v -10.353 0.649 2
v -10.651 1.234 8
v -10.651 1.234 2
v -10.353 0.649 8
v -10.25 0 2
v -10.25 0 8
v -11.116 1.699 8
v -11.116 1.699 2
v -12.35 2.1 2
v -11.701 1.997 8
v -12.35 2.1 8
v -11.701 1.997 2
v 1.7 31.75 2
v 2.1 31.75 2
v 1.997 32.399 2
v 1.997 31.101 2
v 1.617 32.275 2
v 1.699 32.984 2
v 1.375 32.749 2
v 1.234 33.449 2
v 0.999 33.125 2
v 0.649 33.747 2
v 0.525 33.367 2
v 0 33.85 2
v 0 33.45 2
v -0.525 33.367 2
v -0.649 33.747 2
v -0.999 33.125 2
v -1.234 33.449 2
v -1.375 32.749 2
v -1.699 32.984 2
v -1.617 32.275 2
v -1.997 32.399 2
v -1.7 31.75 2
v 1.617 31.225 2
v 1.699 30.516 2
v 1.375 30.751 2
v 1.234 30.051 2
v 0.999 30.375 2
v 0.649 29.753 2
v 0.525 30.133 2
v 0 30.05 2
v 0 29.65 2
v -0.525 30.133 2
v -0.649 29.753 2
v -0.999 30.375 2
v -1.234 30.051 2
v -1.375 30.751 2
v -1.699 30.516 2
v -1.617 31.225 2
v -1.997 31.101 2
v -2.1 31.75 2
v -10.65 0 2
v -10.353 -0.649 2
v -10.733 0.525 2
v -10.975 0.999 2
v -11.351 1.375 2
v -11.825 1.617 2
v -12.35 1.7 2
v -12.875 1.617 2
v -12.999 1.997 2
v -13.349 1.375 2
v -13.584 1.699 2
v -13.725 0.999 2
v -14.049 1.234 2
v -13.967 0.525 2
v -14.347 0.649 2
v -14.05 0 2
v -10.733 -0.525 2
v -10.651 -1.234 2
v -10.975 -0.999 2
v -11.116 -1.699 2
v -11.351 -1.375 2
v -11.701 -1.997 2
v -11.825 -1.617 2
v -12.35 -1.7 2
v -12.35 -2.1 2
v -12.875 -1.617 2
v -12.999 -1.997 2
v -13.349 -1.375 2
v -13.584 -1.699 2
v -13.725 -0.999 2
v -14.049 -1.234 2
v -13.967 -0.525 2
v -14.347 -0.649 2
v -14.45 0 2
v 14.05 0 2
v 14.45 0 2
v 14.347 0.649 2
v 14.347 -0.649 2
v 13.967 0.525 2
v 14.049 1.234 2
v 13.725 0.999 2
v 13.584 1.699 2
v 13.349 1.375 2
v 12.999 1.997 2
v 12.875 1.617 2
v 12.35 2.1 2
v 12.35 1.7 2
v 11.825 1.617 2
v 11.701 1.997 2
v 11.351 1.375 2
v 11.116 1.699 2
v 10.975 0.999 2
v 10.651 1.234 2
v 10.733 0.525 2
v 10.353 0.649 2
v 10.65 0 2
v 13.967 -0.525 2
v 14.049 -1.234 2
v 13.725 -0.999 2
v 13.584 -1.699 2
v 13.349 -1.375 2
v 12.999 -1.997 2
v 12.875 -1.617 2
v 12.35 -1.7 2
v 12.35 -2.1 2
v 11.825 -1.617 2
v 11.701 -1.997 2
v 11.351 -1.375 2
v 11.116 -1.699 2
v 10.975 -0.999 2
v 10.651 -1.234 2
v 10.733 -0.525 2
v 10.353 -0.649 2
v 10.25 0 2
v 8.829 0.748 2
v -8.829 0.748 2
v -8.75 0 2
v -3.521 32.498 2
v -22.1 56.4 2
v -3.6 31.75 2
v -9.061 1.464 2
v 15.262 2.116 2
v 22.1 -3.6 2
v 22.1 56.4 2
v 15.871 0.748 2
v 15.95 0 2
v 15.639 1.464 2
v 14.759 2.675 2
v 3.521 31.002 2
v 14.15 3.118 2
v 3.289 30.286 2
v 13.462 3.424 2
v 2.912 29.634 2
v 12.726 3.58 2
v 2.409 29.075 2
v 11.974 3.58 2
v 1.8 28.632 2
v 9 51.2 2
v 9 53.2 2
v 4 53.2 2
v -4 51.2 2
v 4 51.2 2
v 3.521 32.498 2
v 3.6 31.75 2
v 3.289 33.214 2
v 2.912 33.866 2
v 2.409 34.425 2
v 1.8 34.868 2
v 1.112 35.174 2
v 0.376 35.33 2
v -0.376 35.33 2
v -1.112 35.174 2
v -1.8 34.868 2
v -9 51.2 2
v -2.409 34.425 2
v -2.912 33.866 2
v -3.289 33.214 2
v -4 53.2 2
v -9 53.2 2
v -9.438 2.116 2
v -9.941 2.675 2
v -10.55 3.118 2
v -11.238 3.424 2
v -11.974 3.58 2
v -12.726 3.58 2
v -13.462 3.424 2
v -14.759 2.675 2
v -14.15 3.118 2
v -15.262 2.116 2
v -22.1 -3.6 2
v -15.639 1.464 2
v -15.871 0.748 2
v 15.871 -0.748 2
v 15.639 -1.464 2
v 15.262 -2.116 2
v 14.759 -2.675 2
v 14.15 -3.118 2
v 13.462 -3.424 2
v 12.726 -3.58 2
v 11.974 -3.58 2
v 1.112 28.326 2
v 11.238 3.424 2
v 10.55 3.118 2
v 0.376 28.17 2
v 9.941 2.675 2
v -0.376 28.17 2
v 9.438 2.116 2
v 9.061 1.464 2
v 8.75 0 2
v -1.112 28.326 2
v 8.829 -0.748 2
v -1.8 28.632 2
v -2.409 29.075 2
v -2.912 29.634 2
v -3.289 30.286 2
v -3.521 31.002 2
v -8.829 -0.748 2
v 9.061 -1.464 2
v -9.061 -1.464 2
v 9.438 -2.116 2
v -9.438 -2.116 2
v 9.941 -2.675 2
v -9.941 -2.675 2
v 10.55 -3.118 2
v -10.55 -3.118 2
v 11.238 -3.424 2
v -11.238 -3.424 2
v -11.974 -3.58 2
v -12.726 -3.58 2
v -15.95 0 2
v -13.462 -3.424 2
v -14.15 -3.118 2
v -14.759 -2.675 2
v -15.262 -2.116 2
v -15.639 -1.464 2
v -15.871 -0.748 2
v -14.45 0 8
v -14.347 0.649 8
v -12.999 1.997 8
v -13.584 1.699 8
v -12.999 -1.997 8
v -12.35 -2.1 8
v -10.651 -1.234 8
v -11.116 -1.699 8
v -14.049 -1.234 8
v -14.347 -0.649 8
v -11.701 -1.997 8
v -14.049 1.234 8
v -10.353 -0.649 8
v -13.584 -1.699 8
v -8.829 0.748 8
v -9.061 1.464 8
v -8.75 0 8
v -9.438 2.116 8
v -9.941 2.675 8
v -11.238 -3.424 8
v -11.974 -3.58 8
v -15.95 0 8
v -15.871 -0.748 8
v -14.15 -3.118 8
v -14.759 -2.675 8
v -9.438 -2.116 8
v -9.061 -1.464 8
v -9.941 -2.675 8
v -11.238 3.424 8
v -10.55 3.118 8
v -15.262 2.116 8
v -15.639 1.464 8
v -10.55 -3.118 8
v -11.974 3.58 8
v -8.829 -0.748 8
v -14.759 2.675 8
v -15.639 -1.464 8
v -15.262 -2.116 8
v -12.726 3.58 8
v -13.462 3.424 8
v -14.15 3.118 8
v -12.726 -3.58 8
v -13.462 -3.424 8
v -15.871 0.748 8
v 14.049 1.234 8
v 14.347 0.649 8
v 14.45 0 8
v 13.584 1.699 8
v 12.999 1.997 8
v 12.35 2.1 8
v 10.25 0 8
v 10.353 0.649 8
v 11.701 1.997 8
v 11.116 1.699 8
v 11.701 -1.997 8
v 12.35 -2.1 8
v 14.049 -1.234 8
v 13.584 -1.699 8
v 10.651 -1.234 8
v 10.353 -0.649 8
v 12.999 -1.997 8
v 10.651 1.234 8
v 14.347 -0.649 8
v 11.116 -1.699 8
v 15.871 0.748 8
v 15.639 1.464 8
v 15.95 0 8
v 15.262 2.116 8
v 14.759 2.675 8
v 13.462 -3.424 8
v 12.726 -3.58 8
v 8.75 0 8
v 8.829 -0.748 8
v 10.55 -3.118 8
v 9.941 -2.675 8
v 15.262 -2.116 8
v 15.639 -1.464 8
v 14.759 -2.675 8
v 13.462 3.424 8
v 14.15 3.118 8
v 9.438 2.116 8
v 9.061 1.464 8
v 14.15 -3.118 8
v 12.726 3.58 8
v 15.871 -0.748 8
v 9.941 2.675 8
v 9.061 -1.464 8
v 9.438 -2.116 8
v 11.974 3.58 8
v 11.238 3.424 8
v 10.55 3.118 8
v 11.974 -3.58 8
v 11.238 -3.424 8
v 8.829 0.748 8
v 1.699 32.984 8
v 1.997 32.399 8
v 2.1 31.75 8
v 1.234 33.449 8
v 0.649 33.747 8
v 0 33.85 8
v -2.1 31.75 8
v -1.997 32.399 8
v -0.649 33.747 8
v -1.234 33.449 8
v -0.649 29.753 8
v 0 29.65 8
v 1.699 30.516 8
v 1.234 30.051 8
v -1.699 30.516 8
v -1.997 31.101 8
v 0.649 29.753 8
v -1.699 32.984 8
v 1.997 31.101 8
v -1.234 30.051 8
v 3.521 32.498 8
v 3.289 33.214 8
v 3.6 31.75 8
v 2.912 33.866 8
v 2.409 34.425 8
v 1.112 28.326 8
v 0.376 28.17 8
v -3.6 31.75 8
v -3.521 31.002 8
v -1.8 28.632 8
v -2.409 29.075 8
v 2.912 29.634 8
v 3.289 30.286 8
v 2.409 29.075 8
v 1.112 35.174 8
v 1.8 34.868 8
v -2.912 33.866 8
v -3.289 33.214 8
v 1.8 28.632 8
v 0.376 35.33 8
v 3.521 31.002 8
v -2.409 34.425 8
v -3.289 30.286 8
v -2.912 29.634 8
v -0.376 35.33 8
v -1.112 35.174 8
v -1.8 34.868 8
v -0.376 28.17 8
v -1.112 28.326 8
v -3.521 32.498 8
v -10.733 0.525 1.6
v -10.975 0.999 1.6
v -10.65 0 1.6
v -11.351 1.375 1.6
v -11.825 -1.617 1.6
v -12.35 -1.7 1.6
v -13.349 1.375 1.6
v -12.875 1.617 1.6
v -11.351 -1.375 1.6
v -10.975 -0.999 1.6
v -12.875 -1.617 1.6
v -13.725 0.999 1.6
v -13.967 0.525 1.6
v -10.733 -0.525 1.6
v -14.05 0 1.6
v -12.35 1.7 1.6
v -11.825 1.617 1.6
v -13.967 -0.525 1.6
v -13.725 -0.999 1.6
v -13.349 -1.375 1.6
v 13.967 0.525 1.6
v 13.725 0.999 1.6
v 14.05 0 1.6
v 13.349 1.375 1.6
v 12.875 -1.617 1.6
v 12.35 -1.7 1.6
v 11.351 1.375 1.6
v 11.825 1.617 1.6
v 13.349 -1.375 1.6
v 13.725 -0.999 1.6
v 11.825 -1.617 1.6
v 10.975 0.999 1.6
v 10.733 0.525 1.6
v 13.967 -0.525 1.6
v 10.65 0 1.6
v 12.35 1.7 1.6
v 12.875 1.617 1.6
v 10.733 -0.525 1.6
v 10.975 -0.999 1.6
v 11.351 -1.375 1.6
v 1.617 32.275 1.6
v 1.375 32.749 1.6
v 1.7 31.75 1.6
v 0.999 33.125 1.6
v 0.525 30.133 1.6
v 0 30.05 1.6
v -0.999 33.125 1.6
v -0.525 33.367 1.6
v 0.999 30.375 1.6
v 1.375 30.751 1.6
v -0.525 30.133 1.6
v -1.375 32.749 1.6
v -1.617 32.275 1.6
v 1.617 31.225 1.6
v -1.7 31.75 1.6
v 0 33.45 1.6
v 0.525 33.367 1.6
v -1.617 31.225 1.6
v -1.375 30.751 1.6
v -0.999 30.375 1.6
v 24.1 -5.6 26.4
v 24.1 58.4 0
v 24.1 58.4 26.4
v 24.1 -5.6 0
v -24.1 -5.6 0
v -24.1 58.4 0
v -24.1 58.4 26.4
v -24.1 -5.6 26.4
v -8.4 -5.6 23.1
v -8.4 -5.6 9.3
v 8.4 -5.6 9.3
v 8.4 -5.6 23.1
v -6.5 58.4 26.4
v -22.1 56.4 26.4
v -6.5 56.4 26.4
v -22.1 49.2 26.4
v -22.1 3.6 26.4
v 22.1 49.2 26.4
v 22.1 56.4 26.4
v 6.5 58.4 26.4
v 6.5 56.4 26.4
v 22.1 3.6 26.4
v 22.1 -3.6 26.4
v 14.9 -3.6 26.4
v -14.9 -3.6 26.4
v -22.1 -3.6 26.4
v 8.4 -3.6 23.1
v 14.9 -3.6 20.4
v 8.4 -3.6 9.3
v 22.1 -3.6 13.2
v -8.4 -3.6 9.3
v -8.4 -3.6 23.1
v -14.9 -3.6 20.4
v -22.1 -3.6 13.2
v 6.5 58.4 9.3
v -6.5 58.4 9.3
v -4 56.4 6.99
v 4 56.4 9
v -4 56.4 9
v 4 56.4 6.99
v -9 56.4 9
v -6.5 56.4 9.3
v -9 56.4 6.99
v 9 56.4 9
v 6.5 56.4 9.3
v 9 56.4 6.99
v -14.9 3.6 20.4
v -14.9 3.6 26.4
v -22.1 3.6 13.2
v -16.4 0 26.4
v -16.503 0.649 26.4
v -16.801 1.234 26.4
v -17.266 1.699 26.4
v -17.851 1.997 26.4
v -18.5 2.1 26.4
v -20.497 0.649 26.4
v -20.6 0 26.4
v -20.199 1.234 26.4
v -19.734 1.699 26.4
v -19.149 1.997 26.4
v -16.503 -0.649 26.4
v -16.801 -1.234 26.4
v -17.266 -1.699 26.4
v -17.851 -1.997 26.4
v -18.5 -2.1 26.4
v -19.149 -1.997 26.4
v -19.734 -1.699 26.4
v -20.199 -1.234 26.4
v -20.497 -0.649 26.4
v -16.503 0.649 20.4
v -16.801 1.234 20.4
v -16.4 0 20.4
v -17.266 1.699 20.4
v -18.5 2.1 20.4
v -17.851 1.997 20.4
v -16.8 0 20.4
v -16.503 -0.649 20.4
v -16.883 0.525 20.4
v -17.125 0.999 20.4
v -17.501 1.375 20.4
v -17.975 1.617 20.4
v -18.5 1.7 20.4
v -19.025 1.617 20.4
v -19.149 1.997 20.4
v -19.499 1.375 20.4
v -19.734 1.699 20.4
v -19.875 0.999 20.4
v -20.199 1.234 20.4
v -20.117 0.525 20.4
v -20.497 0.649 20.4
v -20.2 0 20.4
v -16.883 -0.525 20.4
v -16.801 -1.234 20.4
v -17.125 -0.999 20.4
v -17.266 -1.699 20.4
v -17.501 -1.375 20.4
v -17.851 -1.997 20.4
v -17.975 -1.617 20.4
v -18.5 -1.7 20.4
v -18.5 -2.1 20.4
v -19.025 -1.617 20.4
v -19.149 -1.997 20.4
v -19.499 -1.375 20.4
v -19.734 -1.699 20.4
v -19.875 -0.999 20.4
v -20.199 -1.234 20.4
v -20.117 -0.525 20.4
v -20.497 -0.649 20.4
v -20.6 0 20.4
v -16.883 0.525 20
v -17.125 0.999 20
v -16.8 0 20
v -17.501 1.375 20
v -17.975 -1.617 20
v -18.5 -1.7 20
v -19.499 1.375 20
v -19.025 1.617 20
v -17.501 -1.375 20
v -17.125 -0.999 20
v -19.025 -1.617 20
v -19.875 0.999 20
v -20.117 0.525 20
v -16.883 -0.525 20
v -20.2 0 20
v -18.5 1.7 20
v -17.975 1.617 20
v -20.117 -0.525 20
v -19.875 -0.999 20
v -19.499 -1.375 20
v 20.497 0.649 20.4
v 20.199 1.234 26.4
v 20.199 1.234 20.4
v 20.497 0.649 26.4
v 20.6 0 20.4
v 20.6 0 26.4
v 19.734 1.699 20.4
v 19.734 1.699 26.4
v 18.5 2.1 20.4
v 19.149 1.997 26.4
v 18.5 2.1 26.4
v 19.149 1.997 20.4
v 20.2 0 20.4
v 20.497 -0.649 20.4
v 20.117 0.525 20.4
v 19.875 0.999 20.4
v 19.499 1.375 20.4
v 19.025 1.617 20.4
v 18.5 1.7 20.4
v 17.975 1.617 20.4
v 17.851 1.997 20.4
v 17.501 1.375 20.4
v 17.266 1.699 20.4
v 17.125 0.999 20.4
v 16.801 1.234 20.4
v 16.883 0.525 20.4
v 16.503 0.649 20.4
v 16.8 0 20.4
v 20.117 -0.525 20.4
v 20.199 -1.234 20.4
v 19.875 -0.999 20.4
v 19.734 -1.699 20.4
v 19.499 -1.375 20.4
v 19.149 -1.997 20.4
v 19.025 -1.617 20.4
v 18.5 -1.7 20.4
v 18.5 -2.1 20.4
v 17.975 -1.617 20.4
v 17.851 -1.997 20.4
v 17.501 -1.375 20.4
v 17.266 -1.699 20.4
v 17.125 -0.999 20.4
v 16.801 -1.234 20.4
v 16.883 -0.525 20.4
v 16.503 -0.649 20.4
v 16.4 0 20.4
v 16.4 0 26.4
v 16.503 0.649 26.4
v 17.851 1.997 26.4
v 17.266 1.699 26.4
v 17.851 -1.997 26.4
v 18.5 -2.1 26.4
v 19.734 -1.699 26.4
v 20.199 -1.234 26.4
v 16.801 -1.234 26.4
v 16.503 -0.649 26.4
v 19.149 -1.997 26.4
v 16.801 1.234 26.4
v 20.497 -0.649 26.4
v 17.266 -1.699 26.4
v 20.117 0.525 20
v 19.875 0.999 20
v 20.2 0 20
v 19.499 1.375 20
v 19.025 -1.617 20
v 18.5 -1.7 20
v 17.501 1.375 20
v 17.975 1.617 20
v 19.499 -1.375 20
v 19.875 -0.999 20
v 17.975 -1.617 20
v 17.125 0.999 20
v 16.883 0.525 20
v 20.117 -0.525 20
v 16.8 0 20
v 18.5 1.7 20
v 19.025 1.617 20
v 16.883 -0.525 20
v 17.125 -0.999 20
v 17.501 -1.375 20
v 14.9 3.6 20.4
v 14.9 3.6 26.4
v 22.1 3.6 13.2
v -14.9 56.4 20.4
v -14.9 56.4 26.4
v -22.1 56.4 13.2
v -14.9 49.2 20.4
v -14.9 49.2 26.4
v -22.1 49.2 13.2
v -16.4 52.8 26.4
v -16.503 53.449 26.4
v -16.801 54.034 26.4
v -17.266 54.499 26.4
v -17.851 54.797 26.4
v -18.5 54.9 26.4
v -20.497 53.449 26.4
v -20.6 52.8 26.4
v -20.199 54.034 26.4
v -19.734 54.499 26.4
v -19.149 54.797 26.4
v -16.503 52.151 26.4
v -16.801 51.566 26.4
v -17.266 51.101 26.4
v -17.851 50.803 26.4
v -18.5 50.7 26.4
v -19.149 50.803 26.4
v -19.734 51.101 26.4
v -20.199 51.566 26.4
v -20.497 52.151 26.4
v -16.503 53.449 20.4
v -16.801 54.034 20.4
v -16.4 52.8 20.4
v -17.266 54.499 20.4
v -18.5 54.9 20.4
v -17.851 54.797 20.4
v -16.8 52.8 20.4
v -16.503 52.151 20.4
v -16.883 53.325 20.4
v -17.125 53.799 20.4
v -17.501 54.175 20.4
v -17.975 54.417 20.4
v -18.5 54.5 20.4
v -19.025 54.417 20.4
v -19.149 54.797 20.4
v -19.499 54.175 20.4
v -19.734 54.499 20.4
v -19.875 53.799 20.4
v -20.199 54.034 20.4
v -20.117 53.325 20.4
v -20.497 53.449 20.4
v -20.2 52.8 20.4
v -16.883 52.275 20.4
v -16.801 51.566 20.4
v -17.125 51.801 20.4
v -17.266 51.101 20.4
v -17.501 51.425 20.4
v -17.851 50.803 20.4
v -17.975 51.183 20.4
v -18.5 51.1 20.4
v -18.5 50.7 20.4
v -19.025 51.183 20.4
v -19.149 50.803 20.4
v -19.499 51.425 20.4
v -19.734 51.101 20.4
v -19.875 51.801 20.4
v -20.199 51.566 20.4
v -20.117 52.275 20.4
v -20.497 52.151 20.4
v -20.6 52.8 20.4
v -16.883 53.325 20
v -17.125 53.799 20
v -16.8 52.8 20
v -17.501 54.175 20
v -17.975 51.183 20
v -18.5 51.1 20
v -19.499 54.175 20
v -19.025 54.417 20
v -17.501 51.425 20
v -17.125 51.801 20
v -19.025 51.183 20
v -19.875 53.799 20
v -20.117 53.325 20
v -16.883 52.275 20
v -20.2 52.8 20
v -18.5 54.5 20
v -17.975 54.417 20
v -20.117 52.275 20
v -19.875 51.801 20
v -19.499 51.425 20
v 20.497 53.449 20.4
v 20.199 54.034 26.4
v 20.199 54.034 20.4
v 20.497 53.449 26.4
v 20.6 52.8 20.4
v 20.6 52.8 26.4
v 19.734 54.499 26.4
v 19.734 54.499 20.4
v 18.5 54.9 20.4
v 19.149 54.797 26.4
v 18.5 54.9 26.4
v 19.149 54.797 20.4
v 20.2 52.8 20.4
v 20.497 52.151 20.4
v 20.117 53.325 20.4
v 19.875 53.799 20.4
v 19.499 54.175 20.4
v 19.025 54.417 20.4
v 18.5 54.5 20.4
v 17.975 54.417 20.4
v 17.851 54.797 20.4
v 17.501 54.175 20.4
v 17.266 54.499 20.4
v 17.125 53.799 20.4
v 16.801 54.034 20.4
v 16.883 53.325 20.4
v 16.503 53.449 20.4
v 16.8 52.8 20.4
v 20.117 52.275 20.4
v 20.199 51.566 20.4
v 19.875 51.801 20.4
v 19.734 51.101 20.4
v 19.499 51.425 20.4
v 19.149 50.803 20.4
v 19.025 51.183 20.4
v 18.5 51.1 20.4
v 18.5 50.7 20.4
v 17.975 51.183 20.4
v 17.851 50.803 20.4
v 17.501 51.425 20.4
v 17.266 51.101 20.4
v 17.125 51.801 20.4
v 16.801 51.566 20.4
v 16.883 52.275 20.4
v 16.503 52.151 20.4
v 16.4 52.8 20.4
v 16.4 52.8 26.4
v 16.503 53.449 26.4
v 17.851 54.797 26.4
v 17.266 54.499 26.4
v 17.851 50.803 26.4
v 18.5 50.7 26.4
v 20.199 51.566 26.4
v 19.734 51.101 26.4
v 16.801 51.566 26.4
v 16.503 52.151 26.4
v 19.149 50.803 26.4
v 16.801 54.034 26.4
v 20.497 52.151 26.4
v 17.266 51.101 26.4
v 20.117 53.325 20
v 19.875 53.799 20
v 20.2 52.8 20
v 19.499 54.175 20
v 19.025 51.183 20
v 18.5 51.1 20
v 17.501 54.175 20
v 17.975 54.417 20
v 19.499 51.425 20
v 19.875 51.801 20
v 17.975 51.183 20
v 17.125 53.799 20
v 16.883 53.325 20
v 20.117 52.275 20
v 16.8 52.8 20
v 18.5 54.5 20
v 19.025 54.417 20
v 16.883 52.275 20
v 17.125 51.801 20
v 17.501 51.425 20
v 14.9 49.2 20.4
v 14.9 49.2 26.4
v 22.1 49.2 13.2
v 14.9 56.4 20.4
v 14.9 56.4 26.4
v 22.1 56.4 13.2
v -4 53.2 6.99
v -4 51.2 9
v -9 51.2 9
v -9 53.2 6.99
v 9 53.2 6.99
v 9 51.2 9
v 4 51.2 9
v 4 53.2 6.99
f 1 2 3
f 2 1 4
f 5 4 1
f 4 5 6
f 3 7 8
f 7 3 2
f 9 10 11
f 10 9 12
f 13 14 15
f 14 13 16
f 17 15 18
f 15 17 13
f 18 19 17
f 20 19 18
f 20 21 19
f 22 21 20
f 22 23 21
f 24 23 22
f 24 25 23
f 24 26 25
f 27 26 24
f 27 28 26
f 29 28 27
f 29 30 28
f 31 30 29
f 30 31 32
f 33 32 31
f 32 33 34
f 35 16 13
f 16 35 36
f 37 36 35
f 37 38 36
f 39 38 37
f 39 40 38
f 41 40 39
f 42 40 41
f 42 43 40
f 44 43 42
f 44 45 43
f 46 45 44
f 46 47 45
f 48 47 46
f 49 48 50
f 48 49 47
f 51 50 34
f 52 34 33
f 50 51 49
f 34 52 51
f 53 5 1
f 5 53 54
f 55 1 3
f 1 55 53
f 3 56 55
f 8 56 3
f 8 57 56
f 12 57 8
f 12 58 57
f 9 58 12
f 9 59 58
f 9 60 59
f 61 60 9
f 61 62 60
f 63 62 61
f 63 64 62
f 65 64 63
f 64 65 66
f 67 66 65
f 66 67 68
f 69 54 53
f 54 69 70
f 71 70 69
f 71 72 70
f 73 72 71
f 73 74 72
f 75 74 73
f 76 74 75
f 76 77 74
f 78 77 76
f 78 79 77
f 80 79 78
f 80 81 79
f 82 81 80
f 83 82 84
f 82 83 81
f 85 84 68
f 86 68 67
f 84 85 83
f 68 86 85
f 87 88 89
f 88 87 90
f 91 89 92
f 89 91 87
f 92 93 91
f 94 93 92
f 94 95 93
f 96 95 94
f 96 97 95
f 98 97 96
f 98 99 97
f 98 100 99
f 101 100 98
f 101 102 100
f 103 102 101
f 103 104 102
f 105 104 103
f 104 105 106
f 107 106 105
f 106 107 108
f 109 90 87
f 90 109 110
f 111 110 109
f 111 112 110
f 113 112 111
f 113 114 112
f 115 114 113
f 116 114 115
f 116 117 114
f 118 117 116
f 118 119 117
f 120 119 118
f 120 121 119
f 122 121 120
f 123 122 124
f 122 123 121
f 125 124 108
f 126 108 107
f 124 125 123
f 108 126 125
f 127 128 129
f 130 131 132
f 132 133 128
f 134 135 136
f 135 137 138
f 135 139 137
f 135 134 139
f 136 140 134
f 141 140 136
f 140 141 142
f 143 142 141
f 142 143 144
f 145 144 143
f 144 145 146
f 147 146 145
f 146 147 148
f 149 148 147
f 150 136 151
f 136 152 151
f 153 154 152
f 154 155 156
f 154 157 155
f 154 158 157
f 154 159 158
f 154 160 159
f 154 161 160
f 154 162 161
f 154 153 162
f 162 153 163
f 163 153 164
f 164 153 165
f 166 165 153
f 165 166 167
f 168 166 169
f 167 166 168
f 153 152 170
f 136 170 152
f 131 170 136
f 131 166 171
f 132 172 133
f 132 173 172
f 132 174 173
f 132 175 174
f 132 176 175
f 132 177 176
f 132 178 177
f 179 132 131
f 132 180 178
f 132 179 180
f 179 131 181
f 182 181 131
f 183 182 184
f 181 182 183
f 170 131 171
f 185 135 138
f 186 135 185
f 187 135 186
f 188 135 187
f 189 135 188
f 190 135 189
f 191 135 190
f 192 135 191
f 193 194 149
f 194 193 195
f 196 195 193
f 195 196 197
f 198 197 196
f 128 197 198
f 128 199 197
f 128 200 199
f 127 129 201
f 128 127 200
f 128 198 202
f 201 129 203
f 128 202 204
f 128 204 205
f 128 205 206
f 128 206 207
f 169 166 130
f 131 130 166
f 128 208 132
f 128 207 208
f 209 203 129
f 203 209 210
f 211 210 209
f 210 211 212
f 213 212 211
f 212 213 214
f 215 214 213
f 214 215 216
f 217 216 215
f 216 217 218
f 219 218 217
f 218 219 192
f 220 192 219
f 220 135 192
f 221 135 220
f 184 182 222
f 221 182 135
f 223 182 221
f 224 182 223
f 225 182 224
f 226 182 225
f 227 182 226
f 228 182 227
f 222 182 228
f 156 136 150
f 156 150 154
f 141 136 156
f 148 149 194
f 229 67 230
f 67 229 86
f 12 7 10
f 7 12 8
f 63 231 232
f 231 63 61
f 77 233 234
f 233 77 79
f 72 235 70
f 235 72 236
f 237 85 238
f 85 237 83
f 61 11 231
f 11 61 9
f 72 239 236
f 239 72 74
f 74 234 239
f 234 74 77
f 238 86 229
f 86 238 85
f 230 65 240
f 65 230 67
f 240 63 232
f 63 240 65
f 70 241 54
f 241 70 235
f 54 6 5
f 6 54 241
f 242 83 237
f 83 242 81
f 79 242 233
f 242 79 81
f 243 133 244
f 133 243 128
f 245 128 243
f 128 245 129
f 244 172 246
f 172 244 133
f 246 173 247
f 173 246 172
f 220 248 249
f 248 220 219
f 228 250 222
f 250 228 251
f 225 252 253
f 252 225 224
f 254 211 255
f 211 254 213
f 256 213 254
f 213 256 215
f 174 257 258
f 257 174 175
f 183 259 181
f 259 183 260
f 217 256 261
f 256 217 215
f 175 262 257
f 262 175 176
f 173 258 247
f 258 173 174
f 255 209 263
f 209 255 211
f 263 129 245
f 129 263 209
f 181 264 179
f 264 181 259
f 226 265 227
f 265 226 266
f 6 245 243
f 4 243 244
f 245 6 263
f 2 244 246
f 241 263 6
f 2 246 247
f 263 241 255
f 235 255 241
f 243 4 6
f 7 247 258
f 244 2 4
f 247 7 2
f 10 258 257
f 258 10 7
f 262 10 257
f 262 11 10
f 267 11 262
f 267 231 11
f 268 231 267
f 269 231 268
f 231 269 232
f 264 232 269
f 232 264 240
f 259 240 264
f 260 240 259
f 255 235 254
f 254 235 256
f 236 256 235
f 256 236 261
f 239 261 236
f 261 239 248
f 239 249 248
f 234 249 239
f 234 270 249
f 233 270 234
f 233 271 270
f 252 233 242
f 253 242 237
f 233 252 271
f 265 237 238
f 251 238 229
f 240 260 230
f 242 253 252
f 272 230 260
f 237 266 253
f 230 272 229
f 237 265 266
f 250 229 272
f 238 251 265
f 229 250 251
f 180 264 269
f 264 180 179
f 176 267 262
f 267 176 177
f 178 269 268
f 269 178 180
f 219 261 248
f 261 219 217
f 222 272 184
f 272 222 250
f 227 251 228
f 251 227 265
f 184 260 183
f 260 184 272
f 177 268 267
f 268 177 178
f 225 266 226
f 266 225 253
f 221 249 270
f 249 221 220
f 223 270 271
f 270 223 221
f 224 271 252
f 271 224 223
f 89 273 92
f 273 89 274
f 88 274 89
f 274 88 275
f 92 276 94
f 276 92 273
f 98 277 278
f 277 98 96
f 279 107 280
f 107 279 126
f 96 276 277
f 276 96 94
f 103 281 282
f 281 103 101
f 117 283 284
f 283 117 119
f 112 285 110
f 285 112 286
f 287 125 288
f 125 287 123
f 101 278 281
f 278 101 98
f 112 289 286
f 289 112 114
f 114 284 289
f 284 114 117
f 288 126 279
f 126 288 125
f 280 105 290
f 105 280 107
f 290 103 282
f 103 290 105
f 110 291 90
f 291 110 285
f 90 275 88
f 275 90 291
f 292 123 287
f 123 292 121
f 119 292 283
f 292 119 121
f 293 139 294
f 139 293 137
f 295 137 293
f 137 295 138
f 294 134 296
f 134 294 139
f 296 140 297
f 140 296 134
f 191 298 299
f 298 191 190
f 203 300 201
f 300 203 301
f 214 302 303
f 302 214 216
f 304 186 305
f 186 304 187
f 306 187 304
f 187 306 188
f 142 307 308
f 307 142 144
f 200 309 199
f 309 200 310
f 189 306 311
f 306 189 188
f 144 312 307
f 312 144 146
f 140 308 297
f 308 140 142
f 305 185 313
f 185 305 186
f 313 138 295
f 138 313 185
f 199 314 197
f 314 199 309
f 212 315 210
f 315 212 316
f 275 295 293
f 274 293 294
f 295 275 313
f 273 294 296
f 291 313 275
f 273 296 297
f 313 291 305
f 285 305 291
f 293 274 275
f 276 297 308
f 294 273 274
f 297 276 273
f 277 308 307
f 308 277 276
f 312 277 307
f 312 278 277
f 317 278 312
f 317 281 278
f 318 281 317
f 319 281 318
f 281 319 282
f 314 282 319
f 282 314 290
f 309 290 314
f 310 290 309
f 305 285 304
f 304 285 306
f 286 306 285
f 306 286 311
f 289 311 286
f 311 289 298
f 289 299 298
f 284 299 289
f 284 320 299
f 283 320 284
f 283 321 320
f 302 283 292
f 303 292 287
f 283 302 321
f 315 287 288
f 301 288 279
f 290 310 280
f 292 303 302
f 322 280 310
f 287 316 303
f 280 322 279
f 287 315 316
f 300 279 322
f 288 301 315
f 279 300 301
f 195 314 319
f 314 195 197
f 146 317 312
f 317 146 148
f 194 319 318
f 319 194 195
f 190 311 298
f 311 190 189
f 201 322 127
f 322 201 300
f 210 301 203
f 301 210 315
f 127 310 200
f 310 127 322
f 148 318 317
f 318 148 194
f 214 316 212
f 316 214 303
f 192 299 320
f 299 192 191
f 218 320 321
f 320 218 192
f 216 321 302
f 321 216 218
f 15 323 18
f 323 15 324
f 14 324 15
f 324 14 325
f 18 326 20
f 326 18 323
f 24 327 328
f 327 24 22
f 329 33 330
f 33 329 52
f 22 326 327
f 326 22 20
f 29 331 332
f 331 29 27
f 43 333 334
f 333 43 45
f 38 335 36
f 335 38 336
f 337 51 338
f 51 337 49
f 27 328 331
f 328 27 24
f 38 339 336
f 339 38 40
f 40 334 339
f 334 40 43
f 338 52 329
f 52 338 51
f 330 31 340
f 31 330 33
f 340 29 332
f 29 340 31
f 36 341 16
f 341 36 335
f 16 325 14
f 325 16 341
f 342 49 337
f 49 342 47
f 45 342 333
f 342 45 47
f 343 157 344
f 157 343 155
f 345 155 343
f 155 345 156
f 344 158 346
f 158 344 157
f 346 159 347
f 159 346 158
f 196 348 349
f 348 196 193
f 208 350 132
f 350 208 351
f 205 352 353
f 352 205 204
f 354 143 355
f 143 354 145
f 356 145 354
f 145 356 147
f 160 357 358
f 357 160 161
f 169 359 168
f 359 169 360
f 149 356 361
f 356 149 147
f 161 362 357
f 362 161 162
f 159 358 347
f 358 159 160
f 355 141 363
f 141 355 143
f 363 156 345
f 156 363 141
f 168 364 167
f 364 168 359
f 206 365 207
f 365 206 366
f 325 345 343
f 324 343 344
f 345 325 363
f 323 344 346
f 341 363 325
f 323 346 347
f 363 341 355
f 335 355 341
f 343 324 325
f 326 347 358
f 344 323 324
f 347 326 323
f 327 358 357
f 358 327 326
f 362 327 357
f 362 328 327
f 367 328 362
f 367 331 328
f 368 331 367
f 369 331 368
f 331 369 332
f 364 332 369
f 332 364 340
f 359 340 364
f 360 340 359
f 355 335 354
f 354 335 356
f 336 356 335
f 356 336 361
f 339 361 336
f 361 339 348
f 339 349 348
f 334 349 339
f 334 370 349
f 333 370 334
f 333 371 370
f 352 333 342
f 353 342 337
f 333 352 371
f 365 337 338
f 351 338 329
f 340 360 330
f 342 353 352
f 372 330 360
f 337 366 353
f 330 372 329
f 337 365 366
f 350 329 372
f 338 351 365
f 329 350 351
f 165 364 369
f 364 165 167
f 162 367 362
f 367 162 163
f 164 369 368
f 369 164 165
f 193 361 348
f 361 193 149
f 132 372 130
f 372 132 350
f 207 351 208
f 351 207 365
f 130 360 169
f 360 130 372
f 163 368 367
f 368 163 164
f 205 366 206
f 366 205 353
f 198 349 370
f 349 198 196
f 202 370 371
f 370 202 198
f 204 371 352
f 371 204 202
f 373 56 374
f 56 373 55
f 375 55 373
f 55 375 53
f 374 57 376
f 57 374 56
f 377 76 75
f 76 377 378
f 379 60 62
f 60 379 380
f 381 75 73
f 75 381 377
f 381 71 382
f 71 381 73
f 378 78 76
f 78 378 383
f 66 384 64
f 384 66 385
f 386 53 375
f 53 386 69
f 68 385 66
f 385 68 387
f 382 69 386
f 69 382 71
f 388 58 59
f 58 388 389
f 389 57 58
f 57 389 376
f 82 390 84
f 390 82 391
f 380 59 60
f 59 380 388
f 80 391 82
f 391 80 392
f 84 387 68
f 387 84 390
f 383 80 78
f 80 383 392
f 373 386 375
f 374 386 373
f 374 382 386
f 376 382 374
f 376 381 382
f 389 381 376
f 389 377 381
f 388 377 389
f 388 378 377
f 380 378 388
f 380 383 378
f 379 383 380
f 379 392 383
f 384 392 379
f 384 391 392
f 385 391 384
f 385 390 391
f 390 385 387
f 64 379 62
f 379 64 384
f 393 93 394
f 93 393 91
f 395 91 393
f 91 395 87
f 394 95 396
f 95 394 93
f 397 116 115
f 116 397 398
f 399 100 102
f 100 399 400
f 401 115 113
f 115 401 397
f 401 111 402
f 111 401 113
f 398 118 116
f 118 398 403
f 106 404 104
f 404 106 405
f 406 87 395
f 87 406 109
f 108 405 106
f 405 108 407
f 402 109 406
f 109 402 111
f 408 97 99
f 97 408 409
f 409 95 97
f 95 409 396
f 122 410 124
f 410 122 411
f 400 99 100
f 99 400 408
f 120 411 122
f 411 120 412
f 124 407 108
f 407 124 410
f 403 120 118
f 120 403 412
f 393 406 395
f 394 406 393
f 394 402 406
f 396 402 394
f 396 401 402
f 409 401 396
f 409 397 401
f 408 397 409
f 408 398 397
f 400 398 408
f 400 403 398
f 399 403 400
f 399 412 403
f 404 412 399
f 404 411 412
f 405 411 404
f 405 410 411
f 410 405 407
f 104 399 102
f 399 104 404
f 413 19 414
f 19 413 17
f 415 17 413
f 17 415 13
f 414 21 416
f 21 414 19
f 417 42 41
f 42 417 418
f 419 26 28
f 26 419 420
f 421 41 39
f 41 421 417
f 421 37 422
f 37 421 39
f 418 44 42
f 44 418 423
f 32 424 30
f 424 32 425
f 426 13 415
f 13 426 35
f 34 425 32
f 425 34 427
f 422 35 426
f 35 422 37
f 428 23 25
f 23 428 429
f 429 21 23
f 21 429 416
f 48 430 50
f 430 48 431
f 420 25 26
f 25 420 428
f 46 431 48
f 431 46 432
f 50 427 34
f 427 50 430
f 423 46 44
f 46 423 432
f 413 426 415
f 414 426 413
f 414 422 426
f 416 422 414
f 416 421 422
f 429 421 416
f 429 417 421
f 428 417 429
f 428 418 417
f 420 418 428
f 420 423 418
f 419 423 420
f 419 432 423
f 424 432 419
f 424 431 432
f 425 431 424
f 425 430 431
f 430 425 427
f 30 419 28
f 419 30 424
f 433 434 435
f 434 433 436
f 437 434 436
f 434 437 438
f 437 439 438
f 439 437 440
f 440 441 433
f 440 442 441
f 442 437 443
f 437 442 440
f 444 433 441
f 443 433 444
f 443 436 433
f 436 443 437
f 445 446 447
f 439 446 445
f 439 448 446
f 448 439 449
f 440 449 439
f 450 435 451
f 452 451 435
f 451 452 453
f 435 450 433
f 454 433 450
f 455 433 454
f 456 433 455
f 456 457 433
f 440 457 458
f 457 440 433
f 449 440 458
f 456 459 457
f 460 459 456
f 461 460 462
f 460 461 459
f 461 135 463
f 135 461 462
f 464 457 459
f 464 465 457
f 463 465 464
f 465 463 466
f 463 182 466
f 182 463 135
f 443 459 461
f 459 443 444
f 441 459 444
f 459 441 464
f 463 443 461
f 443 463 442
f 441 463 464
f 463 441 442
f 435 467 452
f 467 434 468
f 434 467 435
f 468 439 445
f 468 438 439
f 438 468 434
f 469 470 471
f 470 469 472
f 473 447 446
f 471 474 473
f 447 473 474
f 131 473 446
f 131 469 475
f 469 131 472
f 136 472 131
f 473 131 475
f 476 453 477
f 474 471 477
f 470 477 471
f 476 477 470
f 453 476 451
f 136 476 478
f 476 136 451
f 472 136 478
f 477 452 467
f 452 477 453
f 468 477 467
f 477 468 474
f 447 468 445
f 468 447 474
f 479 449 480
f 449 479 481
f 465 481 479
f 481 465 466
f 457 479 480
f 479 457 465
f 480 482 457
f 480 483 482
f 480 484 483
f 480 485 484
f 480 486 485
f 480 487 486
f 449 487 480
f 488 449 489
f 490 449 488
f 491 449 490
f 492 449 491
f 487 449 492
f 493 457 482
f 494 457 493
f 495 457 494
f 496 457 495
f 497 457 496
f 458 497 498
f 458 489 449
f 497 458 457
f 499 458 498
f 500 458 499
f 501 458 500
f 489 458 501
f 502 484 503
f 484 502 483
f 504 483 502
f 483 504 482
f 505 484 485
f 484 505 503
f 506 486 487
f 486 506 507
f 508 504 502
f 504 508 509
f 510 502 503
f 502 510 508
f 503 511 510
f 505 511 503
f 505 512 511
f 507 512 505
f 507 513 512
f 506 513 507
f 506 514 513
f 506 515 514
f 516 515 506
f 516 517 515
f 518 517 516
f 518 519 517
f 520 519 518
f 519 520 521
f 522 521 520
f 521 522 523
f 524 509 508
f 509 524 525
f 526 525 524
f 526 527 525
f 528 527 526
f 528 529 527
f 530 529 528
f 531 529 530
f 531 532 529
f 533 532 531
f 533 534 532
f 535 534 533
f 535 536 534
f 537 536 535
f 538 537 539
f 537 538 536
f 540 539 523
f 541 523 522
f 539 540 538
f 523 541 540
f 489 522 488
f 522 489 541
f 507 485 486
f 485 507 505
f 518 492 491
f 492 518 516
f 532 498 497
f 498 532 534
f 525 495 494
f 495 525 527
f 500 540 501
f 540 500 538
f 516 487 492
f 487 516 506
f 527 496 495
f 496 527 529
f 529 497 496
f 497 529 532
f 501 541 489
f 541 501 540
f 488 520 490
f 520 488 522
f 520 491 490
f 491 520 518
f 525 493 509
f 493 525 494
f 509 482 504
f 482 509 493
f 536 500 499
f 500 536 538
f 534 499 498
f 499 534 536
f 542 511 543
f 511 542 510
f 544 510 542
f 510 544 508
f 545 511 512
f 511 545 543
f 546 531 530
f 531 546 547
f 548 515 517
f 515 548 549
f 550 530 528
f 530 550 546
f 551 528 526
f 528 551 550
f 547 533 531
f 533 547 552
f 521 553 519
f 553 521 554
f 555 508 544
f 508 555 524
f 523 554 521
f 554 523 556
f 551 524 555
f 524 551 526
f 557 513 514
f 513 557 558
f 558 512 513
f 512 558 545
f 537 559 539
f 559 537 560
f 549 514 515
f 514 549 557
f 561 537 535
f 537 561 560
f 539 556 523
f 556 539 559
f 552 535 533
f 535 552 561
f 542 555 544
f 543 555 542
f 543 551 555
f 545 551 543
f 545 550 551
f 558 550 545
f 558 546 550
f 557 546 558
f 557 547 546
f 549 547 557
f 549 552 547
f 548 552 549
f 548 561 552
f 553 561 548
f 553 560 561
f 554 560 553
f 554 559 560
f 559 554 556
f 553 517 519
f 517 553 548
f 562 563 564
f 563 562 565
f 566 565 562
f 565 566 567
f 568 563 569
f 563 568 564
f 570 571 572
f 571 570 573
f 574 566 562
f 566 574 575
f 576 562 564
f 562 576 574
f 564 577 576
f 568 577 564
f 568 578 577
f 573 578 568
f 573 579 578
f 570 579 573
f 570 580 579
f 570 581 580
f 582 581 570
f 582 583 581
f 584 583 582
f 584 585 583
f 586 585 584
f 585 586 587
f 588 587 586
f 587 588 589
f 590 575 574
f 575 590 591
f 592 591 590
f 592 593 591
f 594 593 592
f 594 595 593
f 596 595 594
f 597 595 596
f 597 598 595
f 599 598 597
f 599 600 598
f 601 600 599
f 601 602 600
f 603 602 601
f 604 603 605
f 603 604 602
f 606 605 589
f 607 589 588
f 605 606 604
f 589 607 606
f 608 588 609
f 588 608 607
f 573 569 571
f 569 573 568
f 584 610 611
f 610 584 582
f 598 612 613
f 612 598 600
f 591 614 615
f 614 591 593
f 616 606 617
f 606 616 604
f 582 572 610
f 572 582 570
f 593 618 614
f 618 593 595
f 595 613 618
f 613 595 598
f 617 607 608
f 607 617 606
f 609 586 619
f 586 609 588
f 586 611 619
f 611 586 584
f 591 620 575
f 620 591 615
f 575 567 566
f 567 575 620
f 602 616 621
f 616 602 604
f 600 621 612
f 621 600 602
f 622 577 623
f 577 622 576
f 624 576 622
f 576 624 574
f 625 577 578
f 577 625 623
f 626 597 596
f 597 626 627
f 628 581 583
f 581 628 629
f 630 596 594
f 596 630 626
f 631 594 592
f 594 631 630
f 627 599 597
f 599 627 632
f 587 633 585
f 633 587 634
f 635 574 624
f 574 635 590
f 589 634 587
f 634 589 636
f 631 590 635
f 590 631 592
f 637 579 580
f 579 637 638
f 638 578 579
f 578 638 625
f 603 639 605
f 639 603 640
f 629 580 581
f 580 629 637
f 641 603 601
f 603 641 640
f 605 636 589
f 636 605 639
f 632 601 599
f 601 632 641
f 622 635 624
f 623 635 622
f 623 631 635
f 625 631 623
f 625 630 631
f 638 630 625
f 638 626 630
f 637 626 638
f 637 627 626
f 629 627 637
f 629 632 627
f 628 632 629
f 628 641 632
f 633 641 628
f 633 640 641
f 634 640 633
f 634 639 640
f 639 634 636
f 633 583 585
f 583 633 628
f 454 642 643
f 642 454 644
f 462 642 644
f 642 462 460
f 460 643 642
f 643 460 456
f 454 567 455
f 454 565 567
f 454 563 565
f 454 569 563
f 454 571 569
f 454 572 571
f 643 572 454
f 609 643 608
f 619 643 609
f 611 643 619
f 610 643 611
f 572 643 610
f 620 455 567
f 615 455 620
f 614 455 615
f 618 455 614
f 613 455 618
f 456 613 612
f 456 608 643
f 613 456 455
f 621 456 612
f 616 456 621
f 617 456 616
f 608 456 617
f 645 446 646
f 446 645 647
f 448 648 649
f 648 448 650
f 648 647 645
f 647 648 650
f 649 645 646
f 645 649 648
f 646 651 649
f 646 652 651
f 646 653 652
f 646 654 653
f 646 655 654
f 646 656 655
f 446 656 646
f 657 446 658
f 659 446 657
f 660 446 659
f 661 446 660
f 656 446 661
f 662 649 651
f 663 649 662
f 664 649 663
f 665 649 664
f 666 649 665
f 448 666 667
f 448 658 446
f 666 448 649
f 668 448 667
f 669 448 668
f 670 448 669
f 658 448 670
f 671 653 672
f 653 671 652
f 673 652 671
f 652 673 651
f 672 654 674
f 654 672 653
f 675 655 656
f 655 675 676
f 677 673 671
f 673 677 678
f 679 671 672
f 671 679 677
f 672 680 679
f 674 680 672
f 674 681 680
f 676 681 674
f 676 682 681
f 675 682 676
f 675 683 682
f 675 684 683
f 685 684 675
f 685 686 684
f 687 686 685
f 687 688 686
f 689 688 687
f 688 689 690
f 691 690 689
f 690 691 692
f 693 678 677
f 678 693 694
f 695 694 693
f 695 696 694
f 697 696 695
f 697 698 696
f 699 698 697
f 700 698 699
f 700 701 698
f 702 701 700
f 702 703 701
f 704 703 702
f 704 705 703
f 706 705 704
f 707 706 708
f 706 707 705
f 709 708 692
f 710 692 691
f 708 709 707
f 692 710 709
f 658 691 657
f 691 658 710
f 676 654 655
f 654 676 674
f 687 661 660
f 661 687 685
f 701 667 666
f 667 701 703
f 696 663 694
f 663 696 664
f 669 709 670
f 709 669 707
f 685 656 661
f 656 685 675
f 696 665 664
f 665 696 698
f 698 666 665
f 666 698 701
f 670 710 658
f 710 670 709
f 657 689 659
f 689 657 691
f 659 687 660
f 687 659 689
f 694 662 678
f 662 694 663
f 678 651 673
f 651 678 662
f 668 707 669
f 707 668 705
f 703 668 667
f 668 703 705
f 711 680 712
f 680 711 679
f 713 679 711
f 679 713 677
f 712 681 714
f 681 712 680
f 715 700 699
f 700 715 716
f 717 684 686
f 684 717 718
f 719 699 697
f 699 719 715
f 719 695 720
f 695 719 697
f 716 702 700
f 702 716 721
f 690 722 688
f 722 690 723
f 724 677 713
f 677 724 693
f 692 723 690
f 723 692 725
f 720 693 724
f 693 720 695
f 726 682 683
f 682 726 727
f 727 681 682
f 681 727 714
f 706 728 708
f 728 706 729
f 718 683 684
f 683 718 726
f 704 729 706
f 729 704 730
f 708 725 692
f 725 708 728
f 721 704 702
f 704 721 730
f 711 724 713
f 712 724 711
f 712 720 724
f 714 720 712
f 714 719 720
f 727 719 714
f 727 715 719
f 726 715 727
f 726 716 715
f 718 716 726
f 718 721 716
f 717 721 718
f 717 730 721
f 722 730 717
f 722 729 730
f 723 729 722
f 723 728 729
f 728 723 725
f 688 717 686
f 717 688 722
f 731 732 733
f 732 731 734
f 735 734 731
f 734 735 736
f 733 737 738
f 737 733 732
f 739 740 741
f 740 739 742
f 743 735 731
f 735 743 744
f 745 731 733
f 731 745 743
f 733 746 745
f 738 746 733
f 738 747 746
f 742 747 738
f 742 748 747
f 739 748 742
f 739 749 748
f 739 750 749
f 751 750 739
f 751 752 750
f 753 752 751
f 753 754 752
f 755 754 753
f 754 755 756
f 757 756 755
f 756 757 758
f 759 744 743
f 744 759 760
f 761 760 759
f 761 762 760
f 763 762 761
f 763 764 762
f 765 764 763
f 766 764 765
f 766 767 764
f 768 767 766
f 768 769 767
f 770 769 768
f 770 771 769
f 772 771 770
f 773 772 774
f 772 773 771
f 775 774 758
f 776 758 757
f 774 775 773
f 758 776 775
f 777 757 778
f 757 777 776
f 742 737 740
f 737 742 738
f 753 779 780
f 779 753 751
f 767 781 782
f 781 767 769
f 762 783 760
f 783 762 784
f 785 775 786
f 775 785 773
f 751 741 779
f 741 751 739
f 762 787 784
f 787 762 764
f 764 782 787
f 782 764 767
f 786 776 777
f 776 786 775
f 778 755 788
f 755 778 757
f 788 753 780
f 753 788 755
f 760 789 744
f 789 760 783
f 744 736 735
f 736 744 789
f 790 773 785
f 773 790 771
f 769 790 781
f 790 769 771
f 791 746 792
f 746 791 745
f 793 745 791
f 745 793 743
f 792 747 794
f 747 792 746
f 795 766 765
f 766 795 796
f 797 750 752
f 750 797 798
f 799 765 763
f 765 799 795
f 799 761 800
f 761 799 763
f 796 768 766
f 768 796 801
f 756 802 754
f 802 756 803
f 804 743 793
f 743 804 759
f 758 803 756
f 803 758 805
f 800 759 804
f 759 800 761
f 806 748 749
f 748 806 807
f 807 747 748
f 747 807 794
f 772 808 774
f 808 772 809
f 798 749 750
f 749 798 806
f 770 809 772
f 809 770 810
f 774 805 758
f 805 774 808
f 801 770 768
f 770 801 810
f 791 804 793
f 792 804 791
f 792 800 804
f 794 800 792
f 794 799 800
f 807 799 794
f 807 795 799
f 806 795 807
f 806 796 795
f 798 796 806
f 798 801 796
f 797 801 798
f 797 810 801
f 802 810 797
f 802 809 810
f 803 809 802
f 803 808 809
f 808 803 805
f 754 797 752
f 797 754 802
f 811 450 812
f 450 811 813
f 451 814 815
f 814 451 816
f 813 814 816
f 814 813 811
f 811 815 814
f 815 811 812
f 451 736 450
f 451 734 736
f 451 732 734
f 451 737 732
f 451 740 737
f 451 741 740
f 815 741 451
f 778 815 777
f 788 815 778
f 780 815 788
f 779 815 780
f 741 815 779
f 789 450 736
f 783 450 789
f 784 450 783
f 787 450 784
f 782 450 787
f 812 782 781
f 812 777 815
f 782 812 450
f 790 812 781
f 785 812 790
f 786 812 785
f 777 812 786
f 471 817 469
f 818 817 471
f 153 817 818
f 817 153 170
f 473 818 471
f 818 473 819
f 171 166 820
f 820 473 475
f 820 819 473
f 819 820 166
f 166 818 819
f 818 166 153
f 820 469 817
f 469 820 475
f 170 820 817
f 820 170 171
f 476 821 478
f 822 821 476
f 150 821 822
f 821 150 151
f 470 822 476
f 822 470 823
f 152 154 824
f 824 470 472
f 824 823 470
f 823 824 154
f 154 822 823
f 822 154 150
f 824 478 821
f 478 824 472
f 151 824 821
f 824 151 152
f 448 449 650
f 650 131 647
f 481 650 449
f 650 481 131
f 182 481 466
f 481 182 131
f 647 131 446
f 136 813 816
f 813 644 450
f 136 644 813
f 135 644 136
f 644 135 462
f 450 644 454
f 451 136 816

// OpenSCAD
front_post_hole_offset = 24.7;
front_post_to_pcb_front = 3.6;
front_to_rear_post_hole_offset = 31.75;

panel_depth = 2;  // The width of the case front/back/sides
panel_offset = max(0.5, panel_depth-3);

// Heatset insert & PCB Post options
heatset_insert_height = 6;
heatset_insert_hole_diameter = 4.2;
heatset_insert_screw_diameter = 3;
screw_space_below_heatset = 0.4;
post_height=heatset_insert_height;// + screw_space_below_heatset;
post_radius = heatset_insert_hole_diameter/2+1.5;
screw_radius = heatset_insert_screw_diameter/2+0.2;

// Constants associated with the case lid
rear_tab_height = 2;  // The height of the tab that will lock the lid in place
rear_tab_height_offset = 1; // How much additional clearance to give the tab
tab_side_clearance = 2; // How much clearance to give each side of the tab

pcb_width = 31.6; // Width of the actual PCB (should be greater than front_post_hole_offset)
pcb_depth = 38+6; // Depth of the actual PCB (should be greater than front_to_rear_post_hole_offset);
pcb_height = 1.6; // Height of the PCB fiberglass (part of the RJ-11 offset)

rj_45_width = 16.8; // Width of the RJ-11 jack (for the hole in the front of the case)
rj_45_height = 13.5+.3; // Height of the RJ-11 jack (for the hole in the front of the case)

exit_hole_width = 13; // Width of the exit hole (in the back of the case)

case_interior_width = pcb_width + 12.6; // Giving 10mm of clearance on either side for wiring, etc. 
case_interior_depth = pcb_depth + 16; // All additional depth is added to the back
case_interior_height = post_height+rj_45_height+pcb_height+3; // This should be equal to post_height + enough room for the RJ-11 jack at a minimum

zip_tie_width = 5;


////// These are defined based on the above. Breaking out to make it more explicit what is happening below)
case_exterior_width = case_interior_width + (panel_depth * 2);
case_exterior_depth = case_interior_depth + (panel_depth * 2);
case_exterior_height = case_interior_height + panel_depth;

// Related to the case lid
case_lid_depth = rear_tab_height + rear_tab_height_offset + 2;
tab_width = (case_exterior_width - exit_hole_width - (2*panel_depth) - (4*tab_side_clearance))/2;


// Lid screw posts
lid_screw_post_width = post_radius*2;  // Making it the same as the PCB holes


//


module post_holes(top_of_post) {
    // Heat set insert
    translate([0,0,top_of_post-heatset_insert_height]) cylinder(r=heatset_insert_hole_diameter/2, h=heatset_insert_height+0.01, $fn=20);
    // Screw hole
    translate([0,0,top_of_post-heatset_insert_height-screw_space_below_heatset]) cylinder(r=screw_radius, h=heatset_insert_height+screw_space_below_heatset+0.01, $fn=20);
}

    
module post_with_nut(panel_depth, panel_offset, negative_only=0) {

    // This is the post
    if(negative_only==0) {
        difference() {
            cylinder(r=post_radius, h=post_height, $fn=30);
            post_holes(post_height);
        }
    } else {
        post_holes(post_height);
    }    
}

module make_posts(negative_only=0) {
    translate([-front_post_hole_offset/2,0,panel_depth]) post_with_nut(panel_depth, panel_offset, negative_only);
    translate([front_post_hole_offset/2,0,panel_depth]) post_with_nut(panel_depth, panel_offset, negative_only);
    translate([0,front_to_rear_post_hole_offset,panel_depth]) post_with_nut(panel_depth, panel_offset, negative_only);
}

make_posts();


// Make the case base
difference() {
    translate([-(case_exterior_width/2), -(front_post_to_pcb_front+panel_depth), 0]) cube([case_exterior_width, case_exterior_depth, panel_depth]);

    make_posts(1);
}

// Make the case front
difference() {
    translate([-(case_exterior_width/2), -(front_post_to_pcb_front+panel_depth), 0]) cube([case_exterior_width, panel_depth, case_exterior_height]);
    translate([-(rj_45_width/2),-(front_post_to_pcb_front+panel_depth+.1),panel_depth+post_height-.3+pcb_height]) cube([rj_45_width, panel_depth+2, rj_45_height]);
    
}

// Make the case left/right
translate([-(case_exterior_width/2),-(front_post_to_pcb_front+panel_depth),0]) cube([panel_depth,case_exterior_depth, case_exterior_height]);
translate([(case_exterior_width/2)-panel_depth,-(front_post_to_pcb_front+panel_depth),0]) cube([panel_depth,case_exterior_depth, case_exterior_height]);


// Make the case rear
translate([0,case_exterior_depth-panel_depth,0]) difference() {
    translate([-(case_exterior_width/2), -(front_post_to_pcb_front+panel_depth), 0]) cube([case_exterior_width, panel_depth, case_exterior_height]);
    translate([-(exit_hole_width/2),-(front_post_to_pcb_front+panel_depth+.1),panel_depth+post_height-.3+pcb_height]) cube([exit_hole_width, panel_depth+2, case_exterior_height + case_lid_depth]);
}


module angle_base_post(angled_height, width, flat_height) {
    difference() {
        cube([angled_height, width, angled_height]);
        translate([-0.01,-0.01,-0.01]) rotate([0,45,0]) cube([angled_height+0.02, width+0.02, angled_height*2]);
    }
    translate([0,0,angled_height]) cube([angled_height, width, flat_height]);
}


module make_lid_screw_post(flip=0) {
    difference() {
        translate([0,0,case_exterior_height-lid_screw_post_width-heatset_insert_height]) {
            if(flip==0) {
                angle_base_post(lid_screw_post_width, lid_screw_post_width, heatset_insert_height);
            } else {
                translate([lid_screw_post_width,lid_screw_post_width,0]) rotate([0,0,180]) angle_base_post(lid_screw_post_width, lid_screw_post_width, heatset_insert_height);
            }
        }
//        cube([lid_screw_post_width,lid_screw_post_width,case_exterior_height]);

        translate([lid_screw_post_width/2,lid_screw_post_width/2,0]) 
        post_holes(case_exterior_height);
    }
}

// Posts to secure the lid
translate([-(case_exterior_width/2)+panel_depth,-(front_post_to_pcb_front),0]) make_lid_screw_post();
translate([(case_exterior_width/2)-panel_depth-lid_screw_post_width,-(front_post_to_pcb_front),0]) make_lid_screw_post(1);

translate([-(case_exterior_width/2)+panel_depth,case_interior_depth-lid_screw_post_width-front_post_to_pcb_front,0]) make_lid_screw_post();
translate([(case_exterior_width/2)-panel_depth-lid_screw_post_width,case_interior_depth-lid_screw_post_width-front_post_to_pcb_front,0]) make_lid_screw_post(1);


// Zip Tie Posts
zip_tie_post_material = panel_depth; // The width of the plastic making up the post

module make_zip_tie_post() {
    zip_tie_post_size = zip_tie_post_material + zip_tie_width;
    difference() {
        cube([zip_tie_width, zip_tie_post_size, zip_tie_post_size]);
        translate([-0.01, zip_tie_post_material, -0.01]) cube([zip_tie_width+0.1, zip_tie_width+0.1, zip_tie_width]);
    }
}

translate([-exit_hole_width/2-zip_tie_width/2,case_interior_depth-lid_screw_post_width-front_post_to_pcb_front+panel_depth,panel_depth]) make_zip_tie_post();
translate([exit_hole_width/2-zip_tie_width/2,case_interior_depth-lid_screw_post_width-front_post_to_pcb_front+panel_depth,panel_depth]) make_zip_tie_post();
